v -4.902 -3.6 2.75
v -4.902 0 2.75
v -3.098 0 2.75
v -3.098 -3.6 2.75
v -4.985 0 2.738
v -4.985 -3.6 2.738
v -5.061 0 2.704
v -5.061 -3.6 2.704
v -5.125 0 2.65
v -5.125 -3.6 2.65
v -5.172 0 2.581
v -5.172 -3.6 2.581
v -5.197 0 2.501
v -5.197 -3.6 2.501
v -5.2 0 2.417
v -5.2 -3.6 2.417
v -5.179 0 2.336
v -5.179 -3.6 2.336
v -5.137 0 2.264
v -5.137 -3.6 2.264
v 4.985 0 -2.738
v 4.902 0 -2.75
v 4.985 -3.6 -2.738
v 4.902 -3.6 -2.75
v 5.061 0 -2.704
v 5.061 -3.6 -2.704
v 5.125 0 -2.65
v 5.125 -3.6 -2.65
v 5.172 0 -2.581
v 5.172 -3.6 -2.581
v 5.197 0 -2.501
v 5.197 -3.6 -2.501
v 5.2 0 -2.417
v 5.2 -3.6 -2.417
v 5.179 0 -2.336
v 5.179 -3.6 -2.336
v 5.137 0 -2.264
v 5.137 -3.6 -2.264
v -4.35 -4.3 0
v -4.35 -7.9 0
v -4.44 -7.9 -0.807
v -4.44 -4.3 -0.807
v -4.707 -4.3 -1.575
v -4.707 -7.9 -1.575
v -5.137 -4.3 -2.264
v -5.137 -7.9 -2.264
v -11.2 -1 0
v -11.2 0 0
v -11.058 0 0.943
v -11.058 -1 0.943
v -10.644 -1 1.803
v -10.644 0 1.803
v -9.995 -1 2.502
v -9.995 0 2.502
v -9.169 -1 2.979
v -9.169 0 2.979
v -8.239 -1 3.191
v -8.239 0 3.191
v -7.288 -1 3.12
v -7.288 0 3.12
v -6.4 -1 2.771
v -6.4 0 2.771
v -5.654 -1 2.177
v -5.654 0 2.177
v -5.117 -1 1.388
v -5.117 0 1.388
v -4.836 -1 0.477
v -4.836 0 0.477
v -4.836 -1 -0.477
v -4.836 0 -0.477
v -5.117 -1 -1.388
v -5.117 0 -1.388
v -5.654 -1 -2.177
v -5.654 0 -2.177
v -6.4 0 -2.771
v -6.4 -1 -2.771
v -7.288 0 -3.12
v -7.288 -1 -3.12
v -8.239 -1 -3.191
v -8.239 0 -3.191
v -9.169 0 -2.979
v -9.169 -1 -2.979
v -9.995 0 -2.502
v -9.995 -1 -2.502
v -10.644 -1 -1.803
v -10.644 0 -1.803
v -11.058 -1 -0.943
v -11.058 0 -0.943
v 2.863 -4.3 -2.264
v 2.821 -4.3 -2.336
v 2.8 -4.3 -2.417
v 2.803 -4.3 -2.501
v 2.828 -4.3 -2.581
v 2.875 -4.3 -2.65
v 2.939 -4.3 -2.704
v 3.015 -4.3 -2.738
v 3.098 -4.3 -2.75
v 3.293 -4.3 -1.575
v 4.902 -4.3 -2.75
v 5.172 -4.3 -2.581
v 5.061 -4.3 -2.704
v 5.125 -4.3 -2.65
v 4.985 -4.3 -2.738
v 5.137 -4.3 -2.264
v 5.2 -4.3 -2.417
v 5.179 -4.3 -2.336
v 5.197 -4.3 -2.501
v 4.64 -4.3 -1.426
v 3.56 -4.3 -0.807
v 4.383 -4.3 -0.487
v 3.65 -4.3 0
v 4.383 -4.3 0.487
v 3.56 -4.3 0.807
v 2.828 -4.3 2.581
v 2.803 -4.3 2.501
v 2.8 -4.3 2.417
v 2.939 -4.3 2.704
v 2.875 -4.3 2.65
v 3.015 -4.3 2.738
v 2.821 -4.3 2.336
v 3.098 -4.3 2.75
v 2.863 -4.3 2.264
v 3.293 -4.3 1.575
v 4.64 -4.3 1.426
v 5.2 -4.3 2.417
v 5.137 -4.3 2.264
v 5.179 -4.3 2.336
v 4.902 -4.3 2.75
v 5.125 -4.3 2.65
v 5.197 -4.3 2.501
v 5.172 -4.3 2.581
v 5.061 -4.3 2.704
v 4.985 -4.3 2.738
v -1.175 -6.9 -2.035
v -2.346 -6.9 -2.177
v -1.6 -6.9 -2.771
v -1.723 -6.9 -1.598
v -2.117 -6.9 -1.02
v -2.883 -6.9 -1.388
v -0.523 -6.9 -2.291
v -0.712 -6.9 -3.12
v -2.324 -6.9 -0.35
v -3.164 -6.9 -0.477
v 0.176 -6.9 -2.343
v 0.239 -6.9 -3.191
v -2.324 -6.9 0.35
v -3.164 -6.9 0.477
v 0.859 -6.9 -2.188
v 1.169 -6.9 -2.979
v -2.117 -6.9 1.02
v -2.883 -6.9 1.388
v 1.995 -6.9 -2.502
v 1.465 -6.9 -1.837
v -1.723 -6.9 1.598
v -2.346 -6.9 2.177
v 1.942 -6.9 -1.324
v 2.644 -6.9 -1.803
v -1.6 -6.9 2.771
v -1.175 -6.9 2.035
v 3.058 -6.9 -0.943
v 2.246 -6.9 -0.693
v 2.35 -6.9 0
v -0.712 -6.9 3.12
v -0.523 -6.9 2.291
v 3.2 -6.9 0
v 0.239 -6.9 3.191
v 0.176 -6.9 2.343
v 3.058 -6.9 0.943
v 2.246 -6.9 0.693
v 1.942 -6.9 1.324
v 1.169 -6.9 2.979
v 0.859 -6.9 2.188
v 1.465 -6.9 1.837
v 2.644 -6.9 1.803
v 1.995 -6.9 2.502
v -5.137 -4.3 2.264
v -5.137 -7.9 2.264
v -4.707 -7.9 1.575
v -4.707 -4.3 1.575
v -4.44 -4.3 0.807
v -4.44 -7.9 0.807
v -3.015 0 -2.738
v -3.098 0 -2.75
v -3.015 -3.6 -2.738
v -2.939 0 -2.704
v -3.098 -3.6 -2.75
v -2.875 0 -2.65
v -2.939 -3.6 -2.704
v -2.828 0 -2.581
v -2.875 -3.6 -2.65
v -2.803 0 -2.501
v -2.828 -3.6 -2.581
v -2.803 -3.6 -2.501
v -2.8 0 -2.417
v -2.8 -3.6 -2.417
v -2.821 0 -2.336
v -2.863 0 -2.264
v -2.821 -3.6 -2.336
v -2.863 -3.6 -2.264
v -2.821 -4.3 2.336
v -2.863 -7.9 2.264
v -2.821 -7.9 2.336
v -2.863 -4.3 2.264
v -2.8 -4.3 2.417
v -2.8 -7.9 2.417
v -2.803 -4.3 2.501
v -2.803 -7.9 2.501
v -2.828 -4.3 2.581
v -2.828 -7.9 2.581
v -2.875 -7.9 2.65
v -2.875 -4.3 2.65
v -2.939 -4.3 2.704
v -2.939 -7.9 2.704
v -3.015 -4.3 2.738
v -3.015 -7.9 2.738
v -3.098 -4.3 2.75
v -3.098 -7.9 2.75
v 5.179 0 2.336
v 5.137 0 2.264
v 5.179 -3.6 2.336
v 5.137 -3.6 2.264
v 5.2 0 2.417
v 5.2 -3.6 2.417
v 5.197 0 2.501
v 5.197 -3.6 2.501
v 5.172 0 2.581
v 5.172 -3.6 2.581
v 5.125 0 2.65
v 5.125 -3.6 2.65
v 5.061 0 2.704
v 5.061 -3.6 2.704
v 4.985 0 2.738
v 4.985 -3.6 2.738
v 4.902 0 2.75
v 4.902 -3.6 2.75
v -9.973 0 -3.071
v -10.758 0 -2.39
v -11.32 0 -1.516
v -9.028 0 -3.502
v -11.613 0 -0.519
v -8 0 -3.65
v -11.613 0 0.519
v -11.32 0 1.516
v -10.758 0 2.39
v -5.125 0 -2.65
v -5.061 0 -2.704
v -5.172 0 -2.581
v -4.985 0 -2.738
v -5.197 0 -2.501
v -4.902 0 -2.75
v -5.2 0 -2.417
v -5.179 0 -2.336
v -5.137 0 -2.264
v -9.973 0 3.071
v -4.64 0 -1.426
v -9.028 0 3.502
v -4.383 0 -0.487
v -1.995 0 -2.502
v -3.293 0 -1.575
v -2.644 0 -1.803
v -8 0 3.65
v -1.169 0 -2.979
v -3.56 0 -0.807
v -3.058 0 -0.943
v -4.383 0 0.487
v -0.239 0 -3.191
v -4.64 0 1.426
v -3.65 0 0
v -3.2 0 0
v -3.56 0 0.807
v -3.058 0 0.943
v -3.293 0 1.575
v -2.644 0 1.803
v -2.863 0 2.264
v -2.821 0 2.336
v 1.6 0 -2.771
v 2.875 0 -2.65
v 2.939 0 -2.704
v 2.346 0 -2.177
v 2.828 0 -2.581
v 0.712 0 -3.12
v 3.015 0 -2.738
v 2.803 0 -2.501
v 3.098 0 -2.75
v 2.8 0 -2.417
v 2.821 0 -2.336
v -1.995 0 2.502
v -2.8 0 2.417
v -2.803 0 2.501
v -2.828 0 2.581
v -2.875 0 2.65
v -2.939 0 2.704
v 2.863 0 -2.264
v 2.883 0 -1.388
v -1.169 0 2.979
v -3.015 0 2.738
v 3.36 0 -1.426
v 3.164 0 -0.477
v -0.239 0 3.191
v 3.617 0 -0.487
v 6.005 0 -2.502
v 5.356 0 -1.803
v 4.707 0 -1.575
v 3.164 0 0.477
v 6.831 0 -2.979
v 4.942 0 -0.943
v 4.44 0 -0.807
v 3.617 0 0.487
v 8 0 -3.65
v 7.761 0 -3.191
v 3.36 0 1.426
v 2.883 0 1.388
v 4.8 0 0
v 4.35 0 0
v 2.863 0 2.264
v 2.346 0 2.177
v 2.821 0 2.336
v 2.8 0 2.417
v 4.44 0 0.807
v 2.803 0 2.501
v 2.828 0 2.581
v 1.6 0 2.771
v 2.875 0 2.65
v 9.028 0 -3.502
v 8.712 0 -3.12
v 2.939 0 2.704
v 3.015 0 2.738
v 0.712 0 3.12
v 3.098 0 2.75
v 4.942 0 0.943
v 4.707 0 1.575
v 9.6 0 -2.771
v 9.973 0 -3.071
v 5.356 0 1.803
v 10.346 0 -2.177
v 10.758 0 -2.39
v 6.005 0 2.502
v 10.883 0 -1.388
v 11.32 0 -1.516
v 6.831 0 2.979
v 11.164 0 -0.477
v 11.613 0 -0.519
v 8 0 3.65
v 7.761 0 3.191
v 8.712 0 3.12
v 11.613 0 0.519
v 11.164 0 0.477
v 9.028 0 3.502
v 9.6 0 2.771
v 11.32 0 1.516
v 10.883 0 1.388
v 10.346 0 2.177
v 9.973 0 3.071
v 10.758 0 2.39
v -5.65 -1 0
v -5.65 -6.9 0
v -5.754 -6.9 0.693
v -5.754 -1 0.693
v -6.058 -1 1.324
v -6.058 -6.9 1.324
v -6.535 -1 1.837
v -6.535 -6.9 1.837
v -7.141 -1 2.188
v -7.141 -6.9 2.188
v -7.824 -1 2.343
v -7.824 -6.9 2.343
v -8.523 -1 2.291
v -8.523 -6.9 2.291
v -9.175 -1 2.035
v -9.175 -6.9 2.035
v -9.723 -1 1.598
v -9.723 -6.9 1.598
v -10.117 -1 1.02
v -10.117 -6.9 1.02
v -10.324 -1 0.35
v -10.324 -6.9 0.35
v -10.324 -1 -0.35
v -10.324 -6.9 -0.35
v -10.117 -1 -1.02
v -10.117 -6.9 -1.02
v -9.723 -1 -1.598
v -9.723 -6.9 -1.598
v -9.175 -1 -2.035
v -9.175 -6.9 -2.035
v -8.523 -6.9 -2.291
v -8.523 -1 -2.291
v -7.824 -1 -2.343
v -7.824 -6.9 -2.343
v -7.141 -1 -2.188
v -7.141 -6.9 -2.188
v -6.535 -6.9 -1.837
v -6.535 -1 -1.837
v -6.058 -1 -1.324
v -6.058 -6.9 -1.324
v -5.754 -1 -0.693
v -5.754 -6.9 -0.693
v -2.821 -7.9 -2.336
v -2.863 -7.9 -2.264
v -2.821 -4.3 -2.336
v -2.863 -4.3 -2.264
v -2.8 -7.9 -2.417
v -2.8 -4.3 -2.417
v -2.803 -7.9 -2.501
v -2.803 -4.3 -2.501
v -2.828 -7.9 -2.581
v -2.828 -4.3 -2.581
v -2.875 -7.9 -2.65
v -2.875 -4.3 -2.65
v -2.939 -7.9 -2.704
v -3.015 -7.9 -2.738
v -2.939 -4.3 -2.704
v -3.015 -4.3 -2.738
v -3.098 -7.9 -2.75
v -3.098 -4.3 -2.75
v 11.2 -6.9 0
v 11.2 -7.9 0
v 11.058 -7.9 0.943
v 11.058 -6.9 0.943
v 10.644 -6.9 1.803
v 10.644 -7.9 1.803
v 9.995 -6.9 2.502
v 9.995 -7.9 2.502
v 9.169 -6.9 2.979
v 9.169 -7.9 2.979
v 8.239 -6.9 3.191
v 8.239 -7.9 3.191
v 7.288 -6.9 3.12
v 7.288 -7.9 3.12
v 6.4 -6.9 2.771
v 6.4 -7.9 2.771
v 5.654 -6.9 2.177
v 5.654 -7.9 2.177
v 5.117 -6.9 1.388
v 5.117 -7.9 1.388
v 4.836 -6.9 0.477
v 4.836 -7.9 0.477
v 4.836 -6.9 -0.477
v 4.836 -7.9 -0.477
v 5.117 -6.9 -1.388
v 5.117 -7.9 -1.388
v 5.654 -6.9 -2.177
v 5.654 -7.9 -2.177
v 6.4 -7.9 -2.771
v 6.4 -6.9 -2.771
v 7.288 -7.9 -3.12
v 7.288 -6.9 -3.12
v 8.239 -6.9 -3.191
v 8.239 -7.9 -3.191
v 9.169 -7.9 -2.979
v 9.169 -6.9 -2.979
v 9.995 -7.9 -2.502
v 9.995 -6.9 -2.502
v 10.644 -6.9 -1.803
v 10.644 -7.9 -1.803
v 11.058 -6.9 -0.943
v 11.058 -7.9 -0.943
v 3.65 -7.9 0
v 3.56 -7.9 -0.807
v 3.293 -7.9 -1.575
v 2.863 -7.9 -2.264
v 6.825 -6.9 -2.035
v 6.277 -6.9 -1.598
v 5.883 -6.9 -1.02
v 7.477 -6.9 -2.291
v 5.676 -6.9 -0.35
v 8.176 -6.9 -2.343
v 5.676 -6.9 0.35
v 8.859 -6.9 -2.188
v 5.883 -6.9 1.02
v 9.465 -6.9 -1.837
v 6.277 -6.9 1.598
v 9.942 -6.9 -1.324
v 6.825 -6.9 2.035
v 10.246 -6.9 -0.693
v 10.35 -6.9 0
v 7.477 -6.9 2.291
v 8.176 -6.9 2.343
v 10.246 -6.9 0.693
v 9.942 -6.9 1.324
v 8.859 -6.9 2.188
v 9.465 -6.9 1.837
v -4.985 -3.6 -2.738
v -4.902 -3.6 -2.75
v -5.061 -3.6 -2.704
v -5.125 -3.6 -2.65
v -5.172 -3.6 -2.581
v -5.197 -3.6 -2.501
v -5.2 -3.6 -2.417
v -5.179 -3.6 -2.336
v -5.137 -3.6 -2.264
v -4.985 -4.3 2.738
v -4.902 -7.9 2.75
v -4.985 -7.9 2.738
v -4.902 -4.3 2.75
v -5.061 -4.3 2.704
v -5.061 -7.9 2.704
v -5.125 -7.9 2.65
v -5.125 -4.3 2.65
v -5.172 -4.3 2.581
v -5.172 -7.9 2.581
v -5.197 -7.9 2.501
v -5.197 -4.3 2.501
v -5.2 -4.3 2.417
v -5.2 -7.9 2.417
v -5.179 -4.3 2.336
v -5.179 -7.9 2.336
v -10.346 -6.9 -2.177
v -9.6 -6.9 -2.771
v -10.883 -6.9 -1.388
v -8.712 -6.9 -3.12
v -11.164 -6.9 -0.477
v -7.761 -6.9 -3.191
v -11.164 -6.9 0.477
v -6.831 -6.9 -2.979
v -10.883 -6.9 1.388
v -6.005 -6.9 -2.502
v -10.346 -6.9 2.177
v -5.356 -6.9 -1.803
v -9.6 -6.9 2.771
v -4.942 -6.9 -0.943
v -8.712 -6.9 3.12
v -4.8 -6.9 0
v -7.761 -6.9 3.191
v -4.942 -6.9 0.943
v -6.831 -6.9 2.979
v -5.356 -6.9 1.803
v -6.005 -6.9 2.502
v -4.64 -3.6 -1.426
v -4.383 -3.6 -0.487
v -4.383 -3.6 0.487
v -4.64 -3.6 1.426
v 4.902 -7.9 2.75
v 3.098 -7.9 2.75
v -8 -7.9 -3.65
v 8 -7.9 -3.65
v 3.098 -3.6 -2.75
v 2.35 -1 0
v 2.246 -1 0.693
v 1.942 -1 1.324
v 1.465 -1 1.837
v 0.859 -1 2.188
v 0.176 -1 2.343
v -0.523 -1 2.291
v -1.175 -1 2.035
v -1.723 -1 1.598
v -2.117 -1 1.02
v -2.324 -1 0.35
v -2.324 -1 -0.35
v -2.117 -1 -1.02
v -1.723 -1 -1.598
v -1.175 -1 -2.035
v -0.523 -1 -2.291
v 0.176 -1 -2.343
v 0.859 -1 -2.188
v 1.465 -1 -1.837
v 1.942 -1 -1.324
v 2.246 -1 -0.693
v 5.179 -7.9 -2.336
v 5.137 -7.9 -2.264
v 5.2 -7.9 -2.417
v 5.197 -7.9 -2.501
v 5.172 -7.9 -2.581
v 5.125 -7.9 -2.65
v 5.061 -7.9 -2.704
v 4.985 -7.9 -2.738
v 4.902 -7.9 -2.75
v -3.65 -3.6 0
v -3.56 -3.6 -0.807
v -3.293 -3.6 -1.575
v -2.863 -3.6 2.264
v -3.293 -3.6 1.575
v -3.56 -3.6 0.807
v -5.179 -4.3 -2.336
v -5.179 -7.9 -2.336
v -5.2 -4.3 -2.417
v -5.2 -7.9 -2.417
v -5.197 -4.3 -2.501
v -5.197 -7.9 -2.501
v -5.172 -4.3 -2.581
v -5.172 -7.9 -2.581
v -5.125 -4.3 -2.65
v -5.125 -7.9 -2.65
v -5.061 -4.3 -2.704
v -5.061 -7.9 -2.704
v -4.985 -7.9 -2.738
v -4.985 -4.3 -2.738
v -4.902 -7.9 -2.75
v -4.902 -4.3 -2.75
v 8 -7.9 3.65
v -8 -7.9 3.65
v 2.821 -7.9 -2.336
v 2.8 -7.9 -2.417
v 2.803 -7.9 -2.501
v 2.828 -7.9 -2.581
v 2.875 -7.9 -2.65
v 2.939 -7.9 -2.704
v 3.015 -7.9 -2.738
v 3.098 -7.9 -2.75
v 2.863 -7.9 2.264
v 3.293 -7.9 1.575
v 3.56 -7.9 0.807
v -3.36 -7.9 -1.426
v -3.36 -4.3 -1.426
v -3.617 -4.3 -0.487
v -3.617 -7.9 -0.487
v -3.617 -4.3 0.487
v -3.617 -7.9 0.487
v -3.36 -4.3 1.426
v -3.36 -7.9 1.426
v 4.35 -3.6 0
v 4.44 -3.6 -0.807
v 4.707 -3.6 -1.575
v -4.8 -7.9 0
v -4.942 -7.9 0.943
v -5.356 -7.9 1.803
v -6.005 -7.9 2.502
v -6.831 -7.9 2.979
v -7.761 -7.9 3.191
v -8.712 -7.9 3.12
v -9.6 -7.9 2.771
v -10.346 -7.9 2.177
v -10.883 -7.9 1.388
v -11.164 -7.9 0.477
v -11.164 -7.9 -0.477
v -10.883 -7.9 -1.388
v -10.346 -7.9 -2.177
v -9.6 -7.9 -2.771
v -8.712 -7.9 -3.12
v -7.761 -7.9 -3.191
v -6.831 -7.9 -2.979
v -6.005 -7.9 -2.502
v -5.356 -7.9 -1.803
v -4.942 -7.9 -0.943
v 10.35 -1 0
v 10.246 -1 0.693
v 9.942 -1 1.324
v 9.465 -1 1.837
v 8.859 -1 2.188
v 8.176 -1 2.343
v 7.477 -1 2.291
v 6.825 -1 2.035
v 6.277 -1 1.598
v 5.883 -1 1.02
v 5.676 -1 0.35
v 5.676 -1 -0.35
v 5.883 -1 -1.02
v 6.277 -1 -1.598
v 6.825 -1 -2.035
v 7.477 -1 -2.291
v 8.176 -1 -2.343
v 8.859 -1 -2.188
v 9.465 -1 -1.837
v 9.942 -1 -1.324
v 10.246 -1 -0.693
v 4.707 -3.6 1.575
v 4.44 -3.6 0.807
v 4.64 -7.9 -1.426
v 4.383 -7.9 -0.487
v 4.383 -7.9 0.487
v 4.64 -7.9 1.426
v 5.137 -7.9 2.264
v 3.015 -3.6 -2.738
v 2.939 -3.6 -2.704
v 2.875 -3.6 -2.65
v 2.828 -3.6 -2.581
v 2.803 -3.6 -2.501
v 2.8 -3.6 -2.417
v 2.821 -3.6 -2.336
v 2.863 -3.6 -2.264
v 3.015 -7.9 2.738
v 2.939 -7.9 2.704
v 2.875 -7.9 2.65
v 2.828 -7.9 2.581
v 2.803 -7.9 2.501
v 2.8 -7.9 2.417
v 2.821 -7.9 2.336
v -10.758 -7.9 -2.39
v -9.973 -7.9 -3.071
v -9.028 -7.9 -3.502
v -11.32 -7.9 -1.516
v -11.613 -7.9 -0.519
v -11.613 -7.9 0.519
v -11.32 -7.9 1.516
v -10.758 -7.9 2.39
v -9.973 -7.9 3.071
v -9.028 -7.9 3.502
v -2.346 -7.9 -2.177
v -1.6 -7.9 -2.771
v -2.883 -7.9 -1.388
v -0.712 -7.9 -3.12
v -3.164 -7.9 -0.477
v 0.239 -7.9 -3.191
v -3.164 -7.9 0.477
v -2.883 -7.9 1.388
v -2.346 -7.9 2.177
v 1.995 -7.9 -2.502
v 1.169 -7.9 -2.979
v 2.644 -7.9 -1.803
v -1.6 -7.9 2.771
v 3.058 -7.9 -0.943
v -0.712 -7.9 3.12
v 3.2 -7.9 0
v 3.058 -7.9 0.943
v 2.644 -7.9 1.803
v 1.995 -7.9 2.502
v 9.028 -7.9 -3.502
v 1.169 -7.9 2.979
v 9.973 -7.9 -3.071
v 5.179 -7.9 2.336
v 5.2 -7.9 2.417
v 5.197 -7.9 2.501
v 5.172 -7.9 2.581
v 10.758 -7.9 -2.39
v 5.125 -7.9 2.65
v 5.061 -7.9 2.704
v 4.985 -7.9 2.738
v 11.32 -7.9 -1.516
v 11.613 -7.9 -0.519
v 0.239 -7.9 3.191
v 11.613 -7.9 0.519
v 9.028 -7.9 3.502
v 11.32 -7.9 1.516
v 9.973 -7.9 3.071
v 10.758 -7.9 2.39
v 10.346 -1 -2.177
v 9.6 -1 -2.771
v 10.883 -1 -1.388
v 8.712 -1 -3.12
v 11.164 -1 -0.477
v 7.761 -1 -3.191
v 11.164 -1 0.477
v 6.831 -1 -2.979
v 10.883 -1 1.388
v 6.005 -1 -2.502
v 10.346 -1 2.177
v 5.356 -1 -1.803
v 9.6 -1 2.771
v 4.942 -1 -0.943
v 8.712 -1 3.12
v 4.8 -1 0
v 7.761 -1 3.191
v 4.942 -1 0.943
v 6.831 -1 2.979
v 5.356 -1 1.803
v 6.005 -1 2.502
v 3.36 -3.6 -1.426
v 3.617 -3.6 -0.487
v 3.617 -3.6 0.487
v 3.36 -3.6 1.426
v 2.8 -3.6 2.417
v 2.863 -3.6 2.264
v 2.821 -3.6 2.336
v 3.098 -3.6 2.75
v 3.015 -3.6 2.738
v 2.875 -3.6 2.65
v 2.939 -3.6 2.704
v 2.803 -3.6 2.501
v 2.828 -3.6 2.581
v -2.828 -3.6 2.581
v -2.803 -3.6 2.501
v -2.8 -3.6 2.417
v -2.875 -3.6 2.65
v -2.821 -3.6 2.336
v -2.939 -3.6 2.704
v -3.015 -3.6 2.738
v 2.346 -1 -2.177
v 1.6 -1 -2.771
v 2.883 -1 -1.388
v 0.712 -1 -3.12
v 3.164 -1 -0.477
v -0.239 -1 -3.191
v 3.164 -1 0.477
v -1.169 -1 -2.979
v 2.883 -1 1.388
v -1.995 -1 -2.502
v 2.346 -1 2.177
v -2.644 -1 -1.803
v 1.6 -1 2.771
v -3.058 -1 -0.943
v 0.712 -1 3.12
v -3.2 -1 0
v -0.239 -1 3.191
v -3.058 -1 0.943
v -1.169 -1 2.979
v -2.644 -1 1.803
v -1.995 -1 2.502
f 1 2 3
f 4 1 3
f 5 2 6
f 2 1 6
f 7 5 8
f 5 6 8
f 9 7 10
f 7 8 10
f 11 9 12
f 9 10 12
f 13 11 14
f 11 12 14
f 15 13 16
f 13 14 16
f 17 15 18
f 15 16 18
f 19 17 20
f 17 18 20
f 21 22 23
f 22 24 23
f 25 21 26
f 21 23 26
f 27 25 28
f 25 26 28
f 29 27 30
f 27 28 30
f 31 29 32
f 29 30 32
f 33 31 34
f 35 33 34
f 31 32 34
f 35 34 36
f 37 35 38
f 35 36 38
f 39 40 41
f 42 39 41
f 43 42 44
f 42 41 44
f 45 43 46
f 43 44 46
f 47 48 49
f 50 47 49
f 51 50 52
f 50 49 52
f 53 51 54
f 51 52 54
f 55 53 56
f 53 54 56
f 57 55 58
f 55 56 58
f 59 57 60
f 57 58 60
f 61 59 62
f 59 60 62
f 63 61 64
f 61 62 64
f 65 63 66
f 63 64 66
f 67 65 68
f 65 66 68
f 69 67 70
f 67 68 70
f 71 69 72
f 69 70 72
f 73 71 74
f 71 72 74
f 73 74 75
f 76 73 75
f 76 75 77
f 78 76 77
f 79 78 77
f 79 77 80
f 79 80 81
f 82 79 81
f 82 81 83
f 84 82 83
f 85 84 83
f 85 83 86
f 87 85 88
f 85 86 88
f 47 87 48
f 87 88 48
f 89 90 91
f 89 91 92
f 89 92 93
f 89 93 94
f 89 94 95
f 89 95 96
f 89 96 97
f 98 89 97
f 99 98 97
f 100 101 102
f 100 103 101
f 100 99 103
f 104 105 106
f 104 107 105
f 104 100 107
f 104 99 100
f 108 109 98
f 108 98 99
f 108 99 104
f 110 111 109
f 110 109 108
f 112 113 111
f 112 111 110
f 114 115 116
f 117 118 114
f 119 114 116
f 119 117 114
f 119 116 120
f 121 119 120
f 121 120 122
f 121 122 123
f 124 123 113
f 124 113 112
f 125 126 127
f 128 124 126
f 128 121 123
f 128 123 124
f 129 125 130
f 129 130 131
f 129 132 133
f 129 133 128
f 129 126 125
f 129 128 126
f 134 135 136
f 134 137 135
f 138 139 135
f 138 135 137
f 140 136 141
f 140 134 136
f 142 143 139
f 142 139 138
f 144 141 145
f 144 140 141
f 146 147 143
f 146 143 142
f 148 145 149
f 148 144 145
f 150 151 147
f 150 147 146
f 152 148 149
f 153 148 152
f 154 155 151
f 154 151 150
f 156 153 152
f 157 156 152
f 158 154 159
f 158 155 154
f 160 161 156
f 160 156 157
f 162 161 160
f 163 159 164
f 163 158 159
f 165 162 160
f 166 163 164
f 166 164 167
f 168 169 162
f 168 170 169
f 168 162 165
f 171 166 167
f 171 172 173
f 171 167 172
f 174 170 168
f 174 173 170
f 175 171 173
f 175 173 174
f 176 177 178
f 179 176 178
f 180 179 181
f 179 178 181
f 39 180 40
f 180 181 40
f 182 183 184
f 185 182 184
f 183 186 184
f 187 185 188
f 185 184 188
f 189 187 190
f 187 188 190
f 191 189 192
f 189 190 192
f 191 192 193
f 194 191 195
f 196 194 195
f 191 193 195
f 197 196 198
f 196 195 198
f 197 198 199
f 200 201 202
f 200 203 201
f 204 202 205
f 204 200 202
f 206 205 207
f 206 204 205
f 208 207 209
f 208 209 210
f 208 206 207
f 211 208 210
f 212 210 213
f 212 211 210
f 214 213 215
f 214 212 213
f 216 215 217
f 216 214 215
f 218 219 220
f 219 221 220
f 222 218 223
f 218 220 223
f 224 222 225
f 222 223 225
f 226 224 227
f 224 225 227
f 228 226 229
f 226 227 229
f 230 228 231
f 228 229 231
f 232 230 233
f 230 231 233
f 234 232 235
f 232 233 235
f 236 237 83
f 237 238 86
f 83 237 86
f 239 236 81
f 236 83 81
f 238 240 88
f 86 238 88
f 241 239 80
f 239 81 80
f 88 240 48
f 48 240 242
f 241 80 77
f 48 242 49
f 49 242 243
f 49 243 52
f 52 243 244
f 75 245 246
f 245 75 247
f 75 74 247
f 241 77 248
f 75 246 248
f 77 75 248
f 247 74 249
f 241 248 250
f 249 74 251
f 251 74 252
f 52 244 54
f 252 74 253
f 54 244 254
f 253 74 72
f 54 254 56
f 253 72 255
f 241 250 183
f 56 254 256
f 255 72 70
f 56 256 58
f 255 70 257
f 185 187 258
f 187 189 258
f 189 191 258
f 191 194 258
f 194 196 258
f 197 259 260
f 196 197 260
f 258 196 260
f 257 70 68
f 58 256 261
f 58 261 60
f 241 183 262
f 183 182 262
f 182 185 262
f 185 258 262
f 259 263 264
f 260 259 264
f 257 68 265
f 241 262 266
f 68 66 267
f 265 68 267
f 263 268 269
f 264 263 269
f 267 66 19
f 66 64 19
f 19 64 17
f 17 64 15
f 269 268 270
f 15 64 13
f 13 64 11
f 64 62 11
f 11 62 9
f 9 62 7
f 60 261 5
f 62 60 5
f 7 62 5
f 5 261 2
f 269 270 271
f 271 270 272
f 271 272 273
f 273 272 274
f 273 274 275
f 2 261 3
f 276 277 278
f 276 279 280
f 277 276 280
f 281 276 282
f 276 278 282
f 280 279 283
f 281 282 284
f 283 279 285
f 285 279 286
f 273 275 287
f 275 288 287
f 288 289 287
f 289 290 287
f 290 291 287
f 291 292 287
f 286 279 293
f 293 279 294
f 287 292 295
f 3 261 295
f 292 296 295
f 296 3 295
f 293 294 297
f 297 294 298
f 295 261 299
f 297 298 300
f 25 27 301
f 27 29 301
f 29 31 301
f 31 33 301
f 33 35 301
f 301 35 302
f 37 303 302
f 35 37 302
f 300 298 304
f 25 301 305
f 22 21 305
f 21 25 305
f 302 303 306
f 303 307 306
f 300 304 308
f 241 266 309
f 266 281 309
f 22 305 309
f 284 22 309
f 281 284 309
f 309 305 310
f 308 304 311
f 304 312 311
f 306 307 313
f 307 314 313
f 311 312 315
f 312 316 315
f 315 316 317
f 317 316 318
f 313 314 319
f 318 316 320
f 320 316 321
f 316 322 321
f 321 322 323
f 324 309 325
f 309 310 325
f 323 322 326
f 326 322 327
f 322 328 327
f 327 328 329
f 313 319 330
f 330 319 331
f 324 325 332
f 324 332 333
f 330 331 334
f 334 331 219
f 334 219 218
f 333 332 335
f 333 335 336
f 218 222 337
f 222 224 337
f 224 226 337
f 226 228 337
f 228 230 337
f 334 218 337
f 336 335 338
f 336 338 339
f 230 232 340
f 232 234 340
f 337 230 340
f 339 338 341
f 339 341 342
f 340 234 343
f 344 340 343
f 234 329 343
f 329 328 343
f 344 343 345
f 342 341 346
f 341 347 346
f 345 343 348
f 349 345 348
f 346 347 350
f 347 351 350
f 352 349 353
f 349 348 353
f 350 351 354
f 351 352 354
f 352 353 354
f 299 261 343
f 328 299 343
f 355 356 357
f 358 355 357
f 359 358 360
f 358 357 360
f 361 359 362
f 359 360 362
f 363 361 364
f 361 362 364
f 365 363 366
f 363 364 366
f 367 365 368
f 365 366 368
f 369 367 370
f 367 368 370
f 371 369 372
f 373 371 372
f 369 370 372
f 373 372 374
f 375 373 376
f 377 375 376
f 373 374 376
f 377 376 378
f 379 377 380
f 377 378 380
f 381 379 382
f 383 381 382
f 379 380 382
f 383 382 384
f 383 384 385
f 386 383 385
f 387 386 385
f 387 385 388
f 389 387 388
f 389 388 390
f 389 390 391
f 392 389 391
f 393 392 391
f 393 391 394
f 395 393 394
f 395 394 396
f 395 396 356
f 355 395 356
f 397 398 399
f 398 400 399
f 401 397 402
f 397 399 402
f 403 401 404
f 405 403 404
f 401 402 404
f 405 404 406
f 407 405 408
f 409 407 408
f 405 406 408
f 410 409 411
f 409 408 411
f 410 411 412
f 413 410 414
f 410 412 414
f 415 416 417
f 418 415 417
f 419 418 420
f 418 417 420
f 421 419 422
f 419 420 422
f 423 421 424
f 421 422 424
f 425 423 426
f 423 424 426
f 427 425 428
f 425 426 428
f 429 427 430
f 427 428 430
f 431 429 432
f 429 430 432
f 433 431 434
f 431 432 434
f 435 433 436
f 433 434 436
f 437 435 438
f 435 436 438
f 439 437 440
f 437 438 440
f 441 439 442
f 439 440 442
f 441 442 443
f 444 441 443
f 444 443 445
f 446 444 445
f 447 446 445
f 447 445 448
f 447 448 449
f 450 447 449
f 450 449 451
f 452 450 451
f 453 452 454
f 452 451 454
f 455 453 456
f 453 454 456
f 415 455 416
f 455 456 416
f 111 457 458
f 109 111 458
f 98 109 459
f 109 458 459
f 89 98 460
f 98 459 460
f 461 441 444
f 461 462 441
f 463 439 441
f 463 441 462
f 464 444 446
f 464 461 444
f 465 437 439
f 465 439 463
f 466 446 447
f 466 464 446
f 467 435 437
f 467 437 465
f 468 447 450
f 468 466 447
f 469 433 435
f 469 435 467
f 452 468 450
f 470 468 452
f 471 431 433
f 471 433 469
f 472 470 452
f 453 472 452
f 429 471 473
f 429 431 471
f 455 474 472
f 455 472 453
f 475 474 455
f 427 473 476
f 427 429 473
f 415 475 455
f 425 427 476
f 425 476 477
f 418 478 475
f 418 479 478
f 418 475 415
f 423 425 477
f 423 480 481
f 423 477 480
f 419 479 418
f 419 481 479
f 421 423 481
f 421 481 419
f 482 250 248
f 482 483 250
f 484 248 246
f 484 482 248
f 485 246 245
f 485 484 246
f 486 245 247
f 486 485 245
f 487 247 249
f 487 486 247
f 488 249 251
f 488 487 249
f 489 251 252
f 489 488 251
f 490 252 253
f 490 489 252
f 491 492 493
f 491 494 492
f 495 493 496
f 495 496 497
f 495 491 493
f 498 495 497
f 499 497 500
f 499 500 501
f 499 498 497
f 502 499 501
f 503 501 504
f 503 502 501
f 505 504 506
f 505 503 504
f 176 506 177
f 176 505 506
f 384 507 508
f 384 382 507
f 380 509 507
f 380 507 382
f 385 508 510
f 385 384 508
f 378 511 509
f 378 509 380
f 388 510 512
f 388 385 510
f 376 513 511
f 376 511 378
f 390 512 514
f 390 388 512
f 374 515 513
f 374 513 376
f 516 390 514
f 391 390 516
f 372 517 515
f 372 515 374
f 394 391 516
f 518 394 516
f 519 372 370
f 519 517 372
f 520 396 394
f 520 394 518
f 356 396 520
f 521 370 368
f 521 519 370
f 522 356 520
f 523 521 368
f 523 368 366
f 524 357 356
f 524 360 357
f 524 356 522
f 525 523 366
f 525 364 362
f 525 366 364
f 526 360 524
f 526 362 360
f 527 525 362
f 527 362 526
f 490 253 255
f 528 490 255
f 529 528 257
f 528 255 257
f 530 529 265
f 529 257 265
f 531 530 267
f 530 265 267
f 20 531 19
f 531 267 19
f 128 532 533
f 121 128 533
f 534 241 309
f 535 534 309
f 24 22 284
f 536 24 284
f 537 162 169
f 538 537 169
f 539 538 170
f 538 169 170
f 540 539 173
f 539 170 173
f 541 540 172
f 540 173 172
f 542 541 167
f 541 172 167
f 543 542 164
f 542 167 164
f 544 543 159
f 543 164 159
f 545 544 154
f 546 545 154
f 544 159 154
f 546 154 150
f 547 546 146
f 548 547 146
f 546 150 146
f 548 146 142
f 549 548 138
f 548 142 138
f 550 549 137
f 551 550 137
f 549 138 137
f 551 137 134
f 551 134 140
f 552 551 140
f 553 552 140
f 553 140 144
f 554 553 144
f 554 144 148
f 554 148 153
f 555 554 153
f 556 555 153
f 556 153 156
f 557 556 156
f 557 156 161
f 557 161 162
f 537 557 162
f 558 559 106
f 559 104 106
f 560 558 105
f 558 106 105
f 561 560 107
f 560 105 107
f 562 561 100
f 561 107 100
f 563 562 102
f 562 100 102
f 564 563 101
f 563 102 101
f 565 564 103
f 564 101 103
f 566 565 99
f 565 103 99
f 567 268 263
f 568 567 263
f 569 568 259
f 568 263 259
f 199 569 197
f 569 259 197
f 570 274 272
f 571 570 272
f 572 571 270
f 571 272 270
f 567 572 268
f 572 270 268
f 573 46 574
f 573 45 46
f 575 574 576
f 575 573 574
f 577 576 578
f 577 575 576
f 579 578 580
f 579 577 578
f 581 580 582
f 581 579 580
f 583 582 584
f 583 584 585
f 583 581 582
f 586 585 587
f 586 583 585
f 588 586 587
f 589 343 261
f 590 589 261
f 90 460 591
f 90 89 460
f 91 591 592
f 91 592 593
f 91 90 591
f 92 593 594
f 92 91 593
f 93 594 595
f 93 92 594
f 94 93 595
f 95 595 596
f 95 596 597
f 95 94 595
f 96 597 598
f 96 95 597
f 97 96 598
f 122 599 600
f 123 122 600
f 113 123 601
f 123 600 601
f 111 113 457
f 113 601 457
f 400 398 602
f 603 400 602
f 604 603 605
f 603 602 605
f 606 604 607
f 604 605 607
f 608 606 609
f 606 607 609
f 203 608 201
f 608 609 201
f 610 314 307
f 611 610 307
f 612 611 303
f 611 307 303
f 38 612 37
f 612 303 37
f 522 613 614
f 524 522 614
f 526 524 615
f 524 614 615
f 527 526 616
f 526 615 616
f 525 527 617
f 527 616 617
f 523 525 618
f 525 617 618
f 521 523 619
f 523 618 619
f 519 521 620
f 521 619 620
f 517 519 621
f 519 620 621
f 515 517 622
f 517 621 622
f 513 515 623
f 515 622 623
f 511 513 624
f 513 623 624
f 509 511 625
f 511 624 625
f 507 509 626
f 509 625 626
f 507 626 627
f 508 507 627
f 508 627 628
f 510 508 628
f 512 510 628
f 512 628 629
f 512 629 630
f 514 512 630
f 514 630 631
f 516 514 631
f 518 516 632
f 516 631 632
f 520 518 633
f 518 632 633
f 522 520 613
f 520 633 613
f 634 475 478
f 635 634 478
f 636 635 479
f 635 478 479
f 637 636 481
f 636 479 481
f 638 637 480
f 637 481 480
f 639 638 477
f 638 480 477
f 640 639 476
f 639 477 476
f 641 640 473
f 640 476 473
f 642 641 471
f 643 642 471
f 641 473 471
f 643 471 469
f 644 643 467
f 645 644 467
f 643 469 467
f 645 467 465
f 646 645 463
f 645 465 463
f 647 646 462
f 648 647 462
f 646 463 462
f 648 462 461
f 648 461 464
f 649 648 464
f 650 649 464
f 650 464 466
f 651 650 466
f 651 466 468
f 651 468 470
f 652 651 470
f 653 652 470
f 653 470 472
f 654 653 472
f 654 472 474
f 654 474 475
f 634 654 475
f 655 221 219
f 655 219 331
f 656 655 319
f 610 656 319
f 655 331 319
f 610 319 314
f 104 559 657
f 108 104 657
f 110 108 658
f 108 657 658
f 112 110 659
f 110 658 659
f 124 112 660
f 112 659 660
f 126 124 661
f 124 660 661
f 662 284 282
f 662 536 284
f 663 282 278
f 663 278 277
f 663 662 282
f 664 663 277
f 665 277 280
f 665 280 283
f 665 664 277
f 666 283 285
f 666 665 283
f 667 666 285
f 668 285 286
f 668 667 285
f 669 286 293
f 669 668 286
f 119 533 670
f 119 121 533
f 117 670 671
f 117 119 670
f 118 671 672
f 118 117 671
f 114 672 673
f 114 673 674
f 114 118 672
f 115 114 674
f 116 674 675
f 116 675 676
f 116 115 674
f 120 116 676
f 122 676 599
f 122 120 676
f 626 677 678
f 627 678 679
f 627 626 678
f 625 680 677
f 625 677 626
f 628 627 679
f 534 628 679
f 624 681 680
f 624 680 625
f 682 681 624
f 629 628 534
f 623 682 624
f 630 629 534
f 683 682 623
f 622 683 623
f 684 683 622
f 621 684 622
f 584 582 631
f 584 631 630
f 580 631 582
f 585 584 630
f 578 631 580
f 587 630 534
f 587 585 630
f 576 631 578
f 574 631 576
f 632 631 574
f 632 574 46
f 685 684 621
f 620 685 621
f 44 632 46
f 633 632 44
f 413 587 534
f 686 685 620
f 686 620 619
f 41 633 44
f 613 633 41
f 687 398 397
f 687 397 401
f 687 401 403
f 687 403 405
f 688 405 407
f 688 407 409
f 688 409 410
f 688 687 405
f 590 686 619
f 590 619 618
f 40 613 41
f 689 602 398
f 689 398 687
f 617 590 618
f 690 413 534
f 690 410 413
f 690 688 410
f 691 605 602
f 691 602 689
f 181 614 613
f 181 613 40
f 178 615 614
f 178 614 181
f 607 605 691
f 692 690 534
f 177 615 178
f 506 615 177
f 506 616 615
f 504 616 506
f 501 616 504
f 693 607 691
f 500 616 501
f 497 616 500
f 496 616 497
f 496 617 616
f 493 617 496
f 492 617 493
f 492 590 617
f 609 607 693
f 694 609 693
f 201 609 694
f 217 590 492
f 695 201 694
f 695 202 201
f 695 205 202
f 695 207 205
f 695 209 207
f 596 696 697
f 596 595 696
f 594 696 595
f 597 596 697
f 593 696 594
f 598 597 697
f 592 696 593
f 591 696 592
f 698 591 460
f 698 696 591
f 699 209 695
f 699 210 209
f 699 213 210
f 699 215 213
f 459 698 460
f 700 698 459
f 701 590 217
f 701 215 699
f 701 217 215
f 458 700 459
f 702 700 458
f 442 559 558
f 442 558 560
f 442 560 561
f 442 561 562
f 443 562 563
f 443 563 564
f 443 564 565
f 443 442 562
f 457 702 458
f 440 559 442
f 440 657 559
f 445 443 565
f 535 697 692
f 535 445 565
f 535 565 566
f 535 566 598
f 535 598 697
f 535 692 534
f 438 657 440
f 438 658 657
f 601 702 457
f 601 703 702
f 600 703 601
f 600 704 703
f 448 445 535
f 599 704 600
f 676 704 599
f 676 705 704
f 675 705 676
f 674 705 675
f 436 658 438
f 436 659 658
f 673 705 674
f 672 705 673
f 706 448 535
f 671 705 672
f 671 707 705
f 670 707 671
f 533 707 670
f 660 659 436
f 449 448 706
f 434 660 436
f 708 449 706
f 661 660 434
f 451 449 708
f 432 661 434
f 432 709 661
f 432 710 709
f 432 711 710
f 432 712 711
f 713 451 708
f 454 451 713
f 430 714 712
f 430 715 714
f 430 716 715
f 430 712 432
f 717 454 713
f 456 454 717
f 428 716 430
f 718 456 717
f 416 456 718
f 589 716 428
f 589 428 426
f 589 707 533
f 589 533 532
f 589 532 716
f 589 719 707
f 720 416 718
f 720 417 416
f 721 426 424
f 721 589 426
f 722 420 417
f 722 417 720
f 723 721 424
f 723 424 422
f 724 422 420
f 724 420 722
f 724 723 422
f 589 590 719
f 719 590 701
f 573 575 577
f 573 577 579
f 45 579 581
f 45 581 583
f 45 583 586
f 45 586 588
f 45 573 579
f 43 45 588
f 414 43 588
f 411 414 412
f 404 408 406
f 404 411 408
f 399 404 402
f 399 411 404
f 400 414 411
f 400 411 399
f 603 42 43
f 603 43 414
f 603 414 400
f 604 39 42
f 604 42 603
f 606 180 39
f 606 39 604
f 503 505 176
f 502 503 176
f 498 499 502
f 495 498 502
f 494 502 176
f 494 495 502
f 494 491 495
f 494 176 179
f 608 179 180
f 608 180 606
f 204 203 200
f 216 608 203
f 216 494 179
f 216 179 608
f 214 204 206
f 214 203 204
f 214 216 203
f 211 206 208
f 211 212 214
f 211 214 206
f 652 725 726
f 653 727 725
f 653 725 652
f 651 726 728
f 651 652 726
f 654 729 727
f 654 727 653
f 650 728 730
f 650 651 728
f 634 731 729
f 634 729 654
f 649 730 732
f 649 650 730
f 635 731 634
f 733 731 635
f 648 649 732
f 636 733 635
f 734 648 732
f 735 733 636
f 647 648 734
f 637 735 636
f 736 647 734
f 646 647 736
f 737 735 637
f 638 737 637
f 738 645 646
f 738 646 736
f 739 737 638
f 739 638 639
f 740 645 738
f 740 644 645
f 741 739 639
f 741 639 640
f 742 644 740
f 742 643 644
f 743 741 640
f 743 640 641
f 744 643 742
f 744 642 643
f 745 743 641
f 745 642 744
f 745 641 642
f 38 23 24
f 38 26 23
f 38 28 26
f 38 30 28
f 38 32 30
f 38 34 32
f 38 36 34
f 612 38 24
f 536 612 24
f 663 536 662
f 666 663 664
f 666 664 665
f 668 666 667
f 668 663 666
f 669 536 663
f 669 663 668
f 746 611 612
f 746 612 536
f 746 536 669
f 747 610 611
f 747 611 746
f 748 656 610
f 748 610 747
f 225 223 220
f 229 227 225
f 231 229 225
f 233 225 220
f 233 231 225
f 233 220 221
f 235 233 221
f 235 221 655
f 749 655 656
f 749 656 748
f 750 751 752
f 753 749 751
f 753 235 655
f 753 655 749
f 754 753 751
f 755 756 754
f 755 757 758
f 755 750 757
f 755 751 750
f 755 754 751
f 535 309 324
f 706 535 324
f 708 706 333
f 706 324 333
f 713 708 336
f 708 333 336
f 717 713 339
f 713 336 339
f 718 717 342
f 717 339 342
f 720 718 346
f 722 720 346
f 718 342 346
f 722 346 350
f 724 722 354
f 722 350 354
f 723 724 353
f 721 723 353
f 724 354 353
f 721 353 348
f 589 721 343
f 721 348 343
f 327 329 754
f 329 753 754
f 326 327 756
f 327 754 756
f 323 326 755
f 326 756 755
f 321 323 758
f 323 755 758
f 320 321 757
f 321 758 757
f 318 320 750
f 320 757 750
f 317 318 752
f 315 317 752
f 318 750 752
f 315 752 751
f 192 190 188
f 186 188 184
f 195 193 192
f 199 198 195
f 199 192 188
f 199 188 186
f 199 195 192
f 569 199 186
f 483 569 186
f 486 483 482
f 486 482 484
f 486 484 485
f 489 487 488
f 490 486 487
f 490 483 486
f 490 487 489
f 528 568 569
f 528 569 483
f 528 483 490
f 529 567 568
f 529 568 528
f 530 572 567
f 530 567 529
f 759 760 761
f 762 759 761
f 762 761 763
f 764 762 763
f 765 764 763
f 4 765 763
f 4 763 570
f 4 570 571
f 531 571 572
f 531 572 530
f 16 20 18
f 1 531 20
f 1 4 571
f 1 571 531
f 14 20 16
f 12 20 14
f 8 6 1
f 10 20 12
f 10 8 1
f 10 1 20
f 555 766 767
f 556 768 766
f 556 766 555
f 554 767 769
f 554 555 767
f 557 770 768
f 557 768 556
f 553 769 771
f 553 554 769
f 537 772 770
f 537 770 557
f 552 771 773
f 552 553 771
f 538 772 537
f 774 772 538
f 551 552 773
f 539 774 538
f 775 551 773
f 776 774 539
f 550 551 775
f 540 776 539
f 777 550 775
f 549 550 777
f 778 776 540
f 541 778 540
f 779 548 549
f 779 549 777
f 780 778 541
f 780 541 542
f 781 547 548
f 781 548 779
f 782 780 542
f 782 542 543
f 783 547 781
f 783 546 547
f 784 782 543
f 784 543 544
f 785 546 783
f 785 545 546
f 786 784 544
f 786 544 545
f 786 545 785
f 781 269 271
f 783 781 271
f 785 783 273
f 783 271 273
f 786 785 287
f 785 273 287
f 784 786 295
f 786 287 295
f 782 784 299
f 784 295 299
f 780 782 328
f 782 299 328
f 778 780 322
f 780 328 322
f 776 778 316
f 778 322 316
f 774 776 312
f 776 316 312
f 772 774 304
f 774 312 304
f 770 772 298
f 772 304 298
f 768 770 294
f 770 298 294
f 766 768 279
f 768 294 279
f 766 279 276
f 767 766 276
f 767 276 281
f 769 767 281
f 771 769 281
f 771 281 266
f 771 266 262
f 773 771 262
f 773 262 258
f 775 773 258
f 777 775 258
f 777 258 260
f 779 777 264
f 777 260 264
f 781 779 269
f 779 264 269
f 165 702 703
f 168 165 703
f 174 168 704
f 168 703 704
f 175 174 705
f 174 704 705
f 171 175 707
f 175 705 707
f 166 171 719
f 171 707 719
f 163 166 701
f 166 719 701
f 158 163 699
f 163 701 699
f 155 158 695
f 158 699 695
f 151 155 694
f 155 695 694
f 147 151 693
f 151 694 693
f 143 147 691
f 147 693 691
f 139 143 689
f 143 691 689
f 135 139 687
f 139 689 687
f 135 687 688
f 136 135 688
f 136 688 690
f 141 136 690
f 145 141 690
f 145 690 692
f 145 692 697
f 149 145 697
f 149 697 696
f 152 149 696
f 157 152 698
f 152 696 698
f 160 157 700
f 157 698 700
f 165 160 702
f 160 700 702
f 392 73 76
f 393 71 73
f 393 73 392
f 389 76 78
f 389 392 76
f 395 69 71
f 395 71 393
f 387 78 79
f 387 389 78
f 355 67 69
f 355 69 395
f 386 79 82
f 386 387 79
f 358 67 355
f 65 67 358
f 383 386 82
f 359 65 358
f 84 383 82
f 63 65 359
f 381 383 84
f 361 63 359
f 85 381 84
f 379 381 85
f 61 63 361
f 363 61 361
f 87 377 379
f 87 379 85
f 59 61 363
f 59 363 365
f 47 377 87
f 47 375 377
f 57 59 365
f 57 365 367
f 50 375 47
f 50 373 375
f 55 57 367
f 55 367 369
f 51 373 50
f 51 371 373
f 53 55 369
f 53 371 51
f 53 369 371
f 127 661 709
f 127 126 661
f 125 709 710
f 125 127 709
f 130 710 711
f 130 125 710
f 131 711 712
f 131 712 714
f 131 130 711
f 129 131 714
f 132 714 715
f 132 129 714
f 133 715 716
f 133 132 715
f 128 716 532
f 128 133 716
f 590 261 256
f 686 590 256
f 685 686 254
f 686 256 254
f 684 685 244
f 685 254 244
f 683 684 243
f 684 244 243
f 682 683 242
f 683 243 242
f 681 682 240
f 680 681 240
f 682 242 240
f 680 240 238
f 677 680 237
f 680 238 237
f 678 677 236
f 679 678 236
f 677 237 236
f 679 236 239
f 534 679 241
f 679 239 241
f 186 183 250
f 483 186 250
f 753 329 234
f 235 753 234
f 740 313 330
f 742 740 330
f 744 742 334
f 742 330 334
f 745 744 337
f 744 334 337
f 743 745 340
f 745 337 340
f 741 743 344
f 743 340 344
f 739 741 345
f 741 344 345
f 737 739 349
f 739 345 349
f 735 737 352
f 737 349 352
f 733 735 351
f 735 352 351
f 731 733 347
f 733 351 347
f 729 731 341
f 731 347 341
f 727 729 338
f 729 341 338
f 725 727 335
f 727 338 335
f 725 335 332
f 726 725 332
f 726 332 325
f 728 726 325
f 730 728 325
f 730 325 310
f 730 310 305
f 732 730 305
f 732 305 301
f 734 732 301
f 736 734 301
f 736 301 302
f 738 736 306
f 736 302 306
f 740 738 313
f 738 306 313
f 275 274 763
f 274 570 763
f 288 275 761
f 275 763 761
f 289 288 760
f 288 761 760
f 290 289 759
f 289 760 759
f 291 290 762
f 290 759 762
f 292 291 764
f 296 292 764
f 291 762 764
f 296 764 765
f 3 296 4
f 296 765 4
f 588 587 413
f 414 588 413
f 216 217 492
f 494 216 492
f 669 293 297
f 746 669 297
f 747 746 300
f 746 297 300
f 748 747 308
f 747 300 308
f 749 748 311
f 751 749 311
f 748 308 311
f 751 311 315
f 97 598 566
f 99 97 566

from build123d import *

# Parameters (mm, degrees)
F1_DEPTH  = 7.9
F2_R      = 3.2
F2_R_2    = 2.35
F3_DEPTH  = 1
F3_FACE_R = 2.35
F4_R      = 2.35
F5_DEPTH  = 7.901
F6_R      = 3.2
F6_R_2    = 2.35
F7_DEPTH  = 1
F9_DEPTH  = 3.6
F11_DEPTH = 3.6
F12_R     = 0.3


with BuildPart() as f1:
    # F0 (on Front) → F1 (new body)
    with BuildSketch(Plane.XZ):
        with BuildLine():
            Line((-8, -3.65), (8, -3.65))
            ThreePointArc((8, -3.65), (11.65, 0), (8, 3.65))
            Line((8, 3.65), (-8, 3.65))
            ThreePointArc((-8, 3.65), (-11.65, 0), (-8, -3.65))
        make_face()
    extrude(amount=F1_DEPTH)

    # F2 (on face) → F3 (cut)
    with BuildSketch(Plane.XZ.offset(7.9)):
        with Locations((-8, 0)):
            Circle(F2_R)
        with Locations((-8, 0)):
            Circle(F2_R_2, mode=Mode.SUBTRACT)
        Circle(F2_R)
        Circle(F2_R_2, mode=Mode.SUBTRACT)
        with Locations((8, 0)):
            Circle(F2_R)
        with Locations((8, 0)):
            Circle(F2_R_2, mode=Mode.SUBTRACT)
    extrude(amount=-F3_DEPTH, mode=Mode.SUBTRACT)

    # F3_face (on face) + F4 (on face) → F5 (cut, through all)
    with BuildSketch(Plane.XZ.offset(7.9)):
        with Locations((-8, 0)):
            Circle(F3_FACE_R)
        with Locations((8, 0)):
            Circle(F3_FACE_R)
    with BuildSketch(Plane.XZ.offset(7.9)):
        Circle(F4_R)
    extrude(amount=-F5_DEPTH, mode=Mode.SUBTRACT)

    # F6 (on face) → F7 (cut)
    with BuildSketch(Plane(origin=(0, 0, 0), x_dir=(-1, 0, 0), z_dir=(0, 1, 0))):
        with Locations((8, 0)):
            Circle(F6_R)
        with Locations((8, 0)):
            Circle(F6_R_2, mode=Mode.SUBTRACT)
        Circle(F6_R)
        Circle(F6_R_2, mode=Mode.SUBTRACT)
        with Locations((-8, 0)):
            Circle(F6_R)
        with Locations((-8, 0)):
            Circle(F6_R_2, mode=Mode.SUBTRACT)
    extrude(amount=-F7_DEPTH, mode=Mode.SUBTRACT)

    # F8 (on face) → F9 (cut)
    with BuildSketch(Plane.XZ.offset(7.9)):
        with BuildLine():
            ThreePointArc((5.6, -2.75), (4.35, 0), (5.6, 2.75))
            Line((5.6, 2.75), (2.4, 2.75))
            ThreePointArc((2.4, 2.75), (3.3228376427, 1.5103807467), (3.65, 0))
            ThreePointArc((3.65, 0), (3.3228376427, -1.5103807467), (2.4, -2.75))
            Line((2.4, -2.75), (5.6, -2.75))
        make_face()
        with BuildLine():
            ThreePointArc((-2.4, -2.75), (-3.65, 0), (-2.4, 2.75))
            Line((-2.4, 2.75), (-5.6, 2.75))
            ThreePointArc((-5.6, 2.75), (-4.6771623573, 1.5103807467), (-4.35, 0))
            ThreePointArc((-4.35, 0), (-4.6771623573, -1.5103807467), (-5.6, -2.75))
            Line((-5.6, -2.75), (-2.4, -2.75))
        make_face()
    extrude(amount=-F9_DEPTH, mode=Mode.SUBTRACT)

    # F10 (on face) → F11 (cut)
    with BuildSketch(Plane(origin=(0, 0, 0), x_dir=(-1, 0, 0), z_dir=(0, 1, 0))):
        with BuildLine():
            ThreePointArc((5.6, -2.75), (4.35, 0), (5.6, 2.75))
            Line((5.6, 2.75), (2.4, 2.75))
            ThreePointArc((2.4, 2.75), (3.3228376427, 1.5103807467), (3.65, 0))
            ThreePointArc((3.65, 0), (3.3228376427, -1.5103807467), (2.4, -2.75))
            Line((2.4, -2.75), (5.6, -2.75))
        make_face()
        with BuildLine():
            ThreePointArc((-2.4, -2.75), (-3.65, 0), (-2.4, 2.75))
            Line((-2.4, 2.75), (-5.6, 2.75))
            ThreePointArc((-5.6, 2.75), (-4.6771623573, 1.5103807467), (-4.35, 0))
            ThreePointArc((-4.35, 0), (-4.6771623573, -1.5103807467), (-5.6, -2.75))
            Line((-5.6, -2.75), (-2.4, -2.75))
        make_face()
    extrude(amount=-F11_DEPTH, mode=Mode.SUBTRACT)

    # F12
    f12_edges = [f1.edges().sort_by_distance(p)[0] for p in [
        (-5.6, -1.8, 2.75),
        (2.4, -1.8, 2.75),
        (2.4, -6.1, 2.75),
        (-5.6, -6.1, 2.75),
        (-2.4, -6.1, 2.75),
        (5.6, -6.1, 2.75),
        (-2.4, -1.8, 2.75),
        (5.6, -1.8, 2.75),
        (-5.6, -1.8, -2.75),
        (2.4, -1.8, -2.75),
        (-2.4, -1.8, -2.75),
        (5.6, -1.8, -2.75),
        (-2.4, -6.1, -2.75),
        (5.6, -6.1, -2.75),
        (-5.6, -6.1, -2.75),
        (2.4, -6.1, -2.75),
    ]]
    fillet(f12_edges, radius=F12_R)


solid = f1.part
